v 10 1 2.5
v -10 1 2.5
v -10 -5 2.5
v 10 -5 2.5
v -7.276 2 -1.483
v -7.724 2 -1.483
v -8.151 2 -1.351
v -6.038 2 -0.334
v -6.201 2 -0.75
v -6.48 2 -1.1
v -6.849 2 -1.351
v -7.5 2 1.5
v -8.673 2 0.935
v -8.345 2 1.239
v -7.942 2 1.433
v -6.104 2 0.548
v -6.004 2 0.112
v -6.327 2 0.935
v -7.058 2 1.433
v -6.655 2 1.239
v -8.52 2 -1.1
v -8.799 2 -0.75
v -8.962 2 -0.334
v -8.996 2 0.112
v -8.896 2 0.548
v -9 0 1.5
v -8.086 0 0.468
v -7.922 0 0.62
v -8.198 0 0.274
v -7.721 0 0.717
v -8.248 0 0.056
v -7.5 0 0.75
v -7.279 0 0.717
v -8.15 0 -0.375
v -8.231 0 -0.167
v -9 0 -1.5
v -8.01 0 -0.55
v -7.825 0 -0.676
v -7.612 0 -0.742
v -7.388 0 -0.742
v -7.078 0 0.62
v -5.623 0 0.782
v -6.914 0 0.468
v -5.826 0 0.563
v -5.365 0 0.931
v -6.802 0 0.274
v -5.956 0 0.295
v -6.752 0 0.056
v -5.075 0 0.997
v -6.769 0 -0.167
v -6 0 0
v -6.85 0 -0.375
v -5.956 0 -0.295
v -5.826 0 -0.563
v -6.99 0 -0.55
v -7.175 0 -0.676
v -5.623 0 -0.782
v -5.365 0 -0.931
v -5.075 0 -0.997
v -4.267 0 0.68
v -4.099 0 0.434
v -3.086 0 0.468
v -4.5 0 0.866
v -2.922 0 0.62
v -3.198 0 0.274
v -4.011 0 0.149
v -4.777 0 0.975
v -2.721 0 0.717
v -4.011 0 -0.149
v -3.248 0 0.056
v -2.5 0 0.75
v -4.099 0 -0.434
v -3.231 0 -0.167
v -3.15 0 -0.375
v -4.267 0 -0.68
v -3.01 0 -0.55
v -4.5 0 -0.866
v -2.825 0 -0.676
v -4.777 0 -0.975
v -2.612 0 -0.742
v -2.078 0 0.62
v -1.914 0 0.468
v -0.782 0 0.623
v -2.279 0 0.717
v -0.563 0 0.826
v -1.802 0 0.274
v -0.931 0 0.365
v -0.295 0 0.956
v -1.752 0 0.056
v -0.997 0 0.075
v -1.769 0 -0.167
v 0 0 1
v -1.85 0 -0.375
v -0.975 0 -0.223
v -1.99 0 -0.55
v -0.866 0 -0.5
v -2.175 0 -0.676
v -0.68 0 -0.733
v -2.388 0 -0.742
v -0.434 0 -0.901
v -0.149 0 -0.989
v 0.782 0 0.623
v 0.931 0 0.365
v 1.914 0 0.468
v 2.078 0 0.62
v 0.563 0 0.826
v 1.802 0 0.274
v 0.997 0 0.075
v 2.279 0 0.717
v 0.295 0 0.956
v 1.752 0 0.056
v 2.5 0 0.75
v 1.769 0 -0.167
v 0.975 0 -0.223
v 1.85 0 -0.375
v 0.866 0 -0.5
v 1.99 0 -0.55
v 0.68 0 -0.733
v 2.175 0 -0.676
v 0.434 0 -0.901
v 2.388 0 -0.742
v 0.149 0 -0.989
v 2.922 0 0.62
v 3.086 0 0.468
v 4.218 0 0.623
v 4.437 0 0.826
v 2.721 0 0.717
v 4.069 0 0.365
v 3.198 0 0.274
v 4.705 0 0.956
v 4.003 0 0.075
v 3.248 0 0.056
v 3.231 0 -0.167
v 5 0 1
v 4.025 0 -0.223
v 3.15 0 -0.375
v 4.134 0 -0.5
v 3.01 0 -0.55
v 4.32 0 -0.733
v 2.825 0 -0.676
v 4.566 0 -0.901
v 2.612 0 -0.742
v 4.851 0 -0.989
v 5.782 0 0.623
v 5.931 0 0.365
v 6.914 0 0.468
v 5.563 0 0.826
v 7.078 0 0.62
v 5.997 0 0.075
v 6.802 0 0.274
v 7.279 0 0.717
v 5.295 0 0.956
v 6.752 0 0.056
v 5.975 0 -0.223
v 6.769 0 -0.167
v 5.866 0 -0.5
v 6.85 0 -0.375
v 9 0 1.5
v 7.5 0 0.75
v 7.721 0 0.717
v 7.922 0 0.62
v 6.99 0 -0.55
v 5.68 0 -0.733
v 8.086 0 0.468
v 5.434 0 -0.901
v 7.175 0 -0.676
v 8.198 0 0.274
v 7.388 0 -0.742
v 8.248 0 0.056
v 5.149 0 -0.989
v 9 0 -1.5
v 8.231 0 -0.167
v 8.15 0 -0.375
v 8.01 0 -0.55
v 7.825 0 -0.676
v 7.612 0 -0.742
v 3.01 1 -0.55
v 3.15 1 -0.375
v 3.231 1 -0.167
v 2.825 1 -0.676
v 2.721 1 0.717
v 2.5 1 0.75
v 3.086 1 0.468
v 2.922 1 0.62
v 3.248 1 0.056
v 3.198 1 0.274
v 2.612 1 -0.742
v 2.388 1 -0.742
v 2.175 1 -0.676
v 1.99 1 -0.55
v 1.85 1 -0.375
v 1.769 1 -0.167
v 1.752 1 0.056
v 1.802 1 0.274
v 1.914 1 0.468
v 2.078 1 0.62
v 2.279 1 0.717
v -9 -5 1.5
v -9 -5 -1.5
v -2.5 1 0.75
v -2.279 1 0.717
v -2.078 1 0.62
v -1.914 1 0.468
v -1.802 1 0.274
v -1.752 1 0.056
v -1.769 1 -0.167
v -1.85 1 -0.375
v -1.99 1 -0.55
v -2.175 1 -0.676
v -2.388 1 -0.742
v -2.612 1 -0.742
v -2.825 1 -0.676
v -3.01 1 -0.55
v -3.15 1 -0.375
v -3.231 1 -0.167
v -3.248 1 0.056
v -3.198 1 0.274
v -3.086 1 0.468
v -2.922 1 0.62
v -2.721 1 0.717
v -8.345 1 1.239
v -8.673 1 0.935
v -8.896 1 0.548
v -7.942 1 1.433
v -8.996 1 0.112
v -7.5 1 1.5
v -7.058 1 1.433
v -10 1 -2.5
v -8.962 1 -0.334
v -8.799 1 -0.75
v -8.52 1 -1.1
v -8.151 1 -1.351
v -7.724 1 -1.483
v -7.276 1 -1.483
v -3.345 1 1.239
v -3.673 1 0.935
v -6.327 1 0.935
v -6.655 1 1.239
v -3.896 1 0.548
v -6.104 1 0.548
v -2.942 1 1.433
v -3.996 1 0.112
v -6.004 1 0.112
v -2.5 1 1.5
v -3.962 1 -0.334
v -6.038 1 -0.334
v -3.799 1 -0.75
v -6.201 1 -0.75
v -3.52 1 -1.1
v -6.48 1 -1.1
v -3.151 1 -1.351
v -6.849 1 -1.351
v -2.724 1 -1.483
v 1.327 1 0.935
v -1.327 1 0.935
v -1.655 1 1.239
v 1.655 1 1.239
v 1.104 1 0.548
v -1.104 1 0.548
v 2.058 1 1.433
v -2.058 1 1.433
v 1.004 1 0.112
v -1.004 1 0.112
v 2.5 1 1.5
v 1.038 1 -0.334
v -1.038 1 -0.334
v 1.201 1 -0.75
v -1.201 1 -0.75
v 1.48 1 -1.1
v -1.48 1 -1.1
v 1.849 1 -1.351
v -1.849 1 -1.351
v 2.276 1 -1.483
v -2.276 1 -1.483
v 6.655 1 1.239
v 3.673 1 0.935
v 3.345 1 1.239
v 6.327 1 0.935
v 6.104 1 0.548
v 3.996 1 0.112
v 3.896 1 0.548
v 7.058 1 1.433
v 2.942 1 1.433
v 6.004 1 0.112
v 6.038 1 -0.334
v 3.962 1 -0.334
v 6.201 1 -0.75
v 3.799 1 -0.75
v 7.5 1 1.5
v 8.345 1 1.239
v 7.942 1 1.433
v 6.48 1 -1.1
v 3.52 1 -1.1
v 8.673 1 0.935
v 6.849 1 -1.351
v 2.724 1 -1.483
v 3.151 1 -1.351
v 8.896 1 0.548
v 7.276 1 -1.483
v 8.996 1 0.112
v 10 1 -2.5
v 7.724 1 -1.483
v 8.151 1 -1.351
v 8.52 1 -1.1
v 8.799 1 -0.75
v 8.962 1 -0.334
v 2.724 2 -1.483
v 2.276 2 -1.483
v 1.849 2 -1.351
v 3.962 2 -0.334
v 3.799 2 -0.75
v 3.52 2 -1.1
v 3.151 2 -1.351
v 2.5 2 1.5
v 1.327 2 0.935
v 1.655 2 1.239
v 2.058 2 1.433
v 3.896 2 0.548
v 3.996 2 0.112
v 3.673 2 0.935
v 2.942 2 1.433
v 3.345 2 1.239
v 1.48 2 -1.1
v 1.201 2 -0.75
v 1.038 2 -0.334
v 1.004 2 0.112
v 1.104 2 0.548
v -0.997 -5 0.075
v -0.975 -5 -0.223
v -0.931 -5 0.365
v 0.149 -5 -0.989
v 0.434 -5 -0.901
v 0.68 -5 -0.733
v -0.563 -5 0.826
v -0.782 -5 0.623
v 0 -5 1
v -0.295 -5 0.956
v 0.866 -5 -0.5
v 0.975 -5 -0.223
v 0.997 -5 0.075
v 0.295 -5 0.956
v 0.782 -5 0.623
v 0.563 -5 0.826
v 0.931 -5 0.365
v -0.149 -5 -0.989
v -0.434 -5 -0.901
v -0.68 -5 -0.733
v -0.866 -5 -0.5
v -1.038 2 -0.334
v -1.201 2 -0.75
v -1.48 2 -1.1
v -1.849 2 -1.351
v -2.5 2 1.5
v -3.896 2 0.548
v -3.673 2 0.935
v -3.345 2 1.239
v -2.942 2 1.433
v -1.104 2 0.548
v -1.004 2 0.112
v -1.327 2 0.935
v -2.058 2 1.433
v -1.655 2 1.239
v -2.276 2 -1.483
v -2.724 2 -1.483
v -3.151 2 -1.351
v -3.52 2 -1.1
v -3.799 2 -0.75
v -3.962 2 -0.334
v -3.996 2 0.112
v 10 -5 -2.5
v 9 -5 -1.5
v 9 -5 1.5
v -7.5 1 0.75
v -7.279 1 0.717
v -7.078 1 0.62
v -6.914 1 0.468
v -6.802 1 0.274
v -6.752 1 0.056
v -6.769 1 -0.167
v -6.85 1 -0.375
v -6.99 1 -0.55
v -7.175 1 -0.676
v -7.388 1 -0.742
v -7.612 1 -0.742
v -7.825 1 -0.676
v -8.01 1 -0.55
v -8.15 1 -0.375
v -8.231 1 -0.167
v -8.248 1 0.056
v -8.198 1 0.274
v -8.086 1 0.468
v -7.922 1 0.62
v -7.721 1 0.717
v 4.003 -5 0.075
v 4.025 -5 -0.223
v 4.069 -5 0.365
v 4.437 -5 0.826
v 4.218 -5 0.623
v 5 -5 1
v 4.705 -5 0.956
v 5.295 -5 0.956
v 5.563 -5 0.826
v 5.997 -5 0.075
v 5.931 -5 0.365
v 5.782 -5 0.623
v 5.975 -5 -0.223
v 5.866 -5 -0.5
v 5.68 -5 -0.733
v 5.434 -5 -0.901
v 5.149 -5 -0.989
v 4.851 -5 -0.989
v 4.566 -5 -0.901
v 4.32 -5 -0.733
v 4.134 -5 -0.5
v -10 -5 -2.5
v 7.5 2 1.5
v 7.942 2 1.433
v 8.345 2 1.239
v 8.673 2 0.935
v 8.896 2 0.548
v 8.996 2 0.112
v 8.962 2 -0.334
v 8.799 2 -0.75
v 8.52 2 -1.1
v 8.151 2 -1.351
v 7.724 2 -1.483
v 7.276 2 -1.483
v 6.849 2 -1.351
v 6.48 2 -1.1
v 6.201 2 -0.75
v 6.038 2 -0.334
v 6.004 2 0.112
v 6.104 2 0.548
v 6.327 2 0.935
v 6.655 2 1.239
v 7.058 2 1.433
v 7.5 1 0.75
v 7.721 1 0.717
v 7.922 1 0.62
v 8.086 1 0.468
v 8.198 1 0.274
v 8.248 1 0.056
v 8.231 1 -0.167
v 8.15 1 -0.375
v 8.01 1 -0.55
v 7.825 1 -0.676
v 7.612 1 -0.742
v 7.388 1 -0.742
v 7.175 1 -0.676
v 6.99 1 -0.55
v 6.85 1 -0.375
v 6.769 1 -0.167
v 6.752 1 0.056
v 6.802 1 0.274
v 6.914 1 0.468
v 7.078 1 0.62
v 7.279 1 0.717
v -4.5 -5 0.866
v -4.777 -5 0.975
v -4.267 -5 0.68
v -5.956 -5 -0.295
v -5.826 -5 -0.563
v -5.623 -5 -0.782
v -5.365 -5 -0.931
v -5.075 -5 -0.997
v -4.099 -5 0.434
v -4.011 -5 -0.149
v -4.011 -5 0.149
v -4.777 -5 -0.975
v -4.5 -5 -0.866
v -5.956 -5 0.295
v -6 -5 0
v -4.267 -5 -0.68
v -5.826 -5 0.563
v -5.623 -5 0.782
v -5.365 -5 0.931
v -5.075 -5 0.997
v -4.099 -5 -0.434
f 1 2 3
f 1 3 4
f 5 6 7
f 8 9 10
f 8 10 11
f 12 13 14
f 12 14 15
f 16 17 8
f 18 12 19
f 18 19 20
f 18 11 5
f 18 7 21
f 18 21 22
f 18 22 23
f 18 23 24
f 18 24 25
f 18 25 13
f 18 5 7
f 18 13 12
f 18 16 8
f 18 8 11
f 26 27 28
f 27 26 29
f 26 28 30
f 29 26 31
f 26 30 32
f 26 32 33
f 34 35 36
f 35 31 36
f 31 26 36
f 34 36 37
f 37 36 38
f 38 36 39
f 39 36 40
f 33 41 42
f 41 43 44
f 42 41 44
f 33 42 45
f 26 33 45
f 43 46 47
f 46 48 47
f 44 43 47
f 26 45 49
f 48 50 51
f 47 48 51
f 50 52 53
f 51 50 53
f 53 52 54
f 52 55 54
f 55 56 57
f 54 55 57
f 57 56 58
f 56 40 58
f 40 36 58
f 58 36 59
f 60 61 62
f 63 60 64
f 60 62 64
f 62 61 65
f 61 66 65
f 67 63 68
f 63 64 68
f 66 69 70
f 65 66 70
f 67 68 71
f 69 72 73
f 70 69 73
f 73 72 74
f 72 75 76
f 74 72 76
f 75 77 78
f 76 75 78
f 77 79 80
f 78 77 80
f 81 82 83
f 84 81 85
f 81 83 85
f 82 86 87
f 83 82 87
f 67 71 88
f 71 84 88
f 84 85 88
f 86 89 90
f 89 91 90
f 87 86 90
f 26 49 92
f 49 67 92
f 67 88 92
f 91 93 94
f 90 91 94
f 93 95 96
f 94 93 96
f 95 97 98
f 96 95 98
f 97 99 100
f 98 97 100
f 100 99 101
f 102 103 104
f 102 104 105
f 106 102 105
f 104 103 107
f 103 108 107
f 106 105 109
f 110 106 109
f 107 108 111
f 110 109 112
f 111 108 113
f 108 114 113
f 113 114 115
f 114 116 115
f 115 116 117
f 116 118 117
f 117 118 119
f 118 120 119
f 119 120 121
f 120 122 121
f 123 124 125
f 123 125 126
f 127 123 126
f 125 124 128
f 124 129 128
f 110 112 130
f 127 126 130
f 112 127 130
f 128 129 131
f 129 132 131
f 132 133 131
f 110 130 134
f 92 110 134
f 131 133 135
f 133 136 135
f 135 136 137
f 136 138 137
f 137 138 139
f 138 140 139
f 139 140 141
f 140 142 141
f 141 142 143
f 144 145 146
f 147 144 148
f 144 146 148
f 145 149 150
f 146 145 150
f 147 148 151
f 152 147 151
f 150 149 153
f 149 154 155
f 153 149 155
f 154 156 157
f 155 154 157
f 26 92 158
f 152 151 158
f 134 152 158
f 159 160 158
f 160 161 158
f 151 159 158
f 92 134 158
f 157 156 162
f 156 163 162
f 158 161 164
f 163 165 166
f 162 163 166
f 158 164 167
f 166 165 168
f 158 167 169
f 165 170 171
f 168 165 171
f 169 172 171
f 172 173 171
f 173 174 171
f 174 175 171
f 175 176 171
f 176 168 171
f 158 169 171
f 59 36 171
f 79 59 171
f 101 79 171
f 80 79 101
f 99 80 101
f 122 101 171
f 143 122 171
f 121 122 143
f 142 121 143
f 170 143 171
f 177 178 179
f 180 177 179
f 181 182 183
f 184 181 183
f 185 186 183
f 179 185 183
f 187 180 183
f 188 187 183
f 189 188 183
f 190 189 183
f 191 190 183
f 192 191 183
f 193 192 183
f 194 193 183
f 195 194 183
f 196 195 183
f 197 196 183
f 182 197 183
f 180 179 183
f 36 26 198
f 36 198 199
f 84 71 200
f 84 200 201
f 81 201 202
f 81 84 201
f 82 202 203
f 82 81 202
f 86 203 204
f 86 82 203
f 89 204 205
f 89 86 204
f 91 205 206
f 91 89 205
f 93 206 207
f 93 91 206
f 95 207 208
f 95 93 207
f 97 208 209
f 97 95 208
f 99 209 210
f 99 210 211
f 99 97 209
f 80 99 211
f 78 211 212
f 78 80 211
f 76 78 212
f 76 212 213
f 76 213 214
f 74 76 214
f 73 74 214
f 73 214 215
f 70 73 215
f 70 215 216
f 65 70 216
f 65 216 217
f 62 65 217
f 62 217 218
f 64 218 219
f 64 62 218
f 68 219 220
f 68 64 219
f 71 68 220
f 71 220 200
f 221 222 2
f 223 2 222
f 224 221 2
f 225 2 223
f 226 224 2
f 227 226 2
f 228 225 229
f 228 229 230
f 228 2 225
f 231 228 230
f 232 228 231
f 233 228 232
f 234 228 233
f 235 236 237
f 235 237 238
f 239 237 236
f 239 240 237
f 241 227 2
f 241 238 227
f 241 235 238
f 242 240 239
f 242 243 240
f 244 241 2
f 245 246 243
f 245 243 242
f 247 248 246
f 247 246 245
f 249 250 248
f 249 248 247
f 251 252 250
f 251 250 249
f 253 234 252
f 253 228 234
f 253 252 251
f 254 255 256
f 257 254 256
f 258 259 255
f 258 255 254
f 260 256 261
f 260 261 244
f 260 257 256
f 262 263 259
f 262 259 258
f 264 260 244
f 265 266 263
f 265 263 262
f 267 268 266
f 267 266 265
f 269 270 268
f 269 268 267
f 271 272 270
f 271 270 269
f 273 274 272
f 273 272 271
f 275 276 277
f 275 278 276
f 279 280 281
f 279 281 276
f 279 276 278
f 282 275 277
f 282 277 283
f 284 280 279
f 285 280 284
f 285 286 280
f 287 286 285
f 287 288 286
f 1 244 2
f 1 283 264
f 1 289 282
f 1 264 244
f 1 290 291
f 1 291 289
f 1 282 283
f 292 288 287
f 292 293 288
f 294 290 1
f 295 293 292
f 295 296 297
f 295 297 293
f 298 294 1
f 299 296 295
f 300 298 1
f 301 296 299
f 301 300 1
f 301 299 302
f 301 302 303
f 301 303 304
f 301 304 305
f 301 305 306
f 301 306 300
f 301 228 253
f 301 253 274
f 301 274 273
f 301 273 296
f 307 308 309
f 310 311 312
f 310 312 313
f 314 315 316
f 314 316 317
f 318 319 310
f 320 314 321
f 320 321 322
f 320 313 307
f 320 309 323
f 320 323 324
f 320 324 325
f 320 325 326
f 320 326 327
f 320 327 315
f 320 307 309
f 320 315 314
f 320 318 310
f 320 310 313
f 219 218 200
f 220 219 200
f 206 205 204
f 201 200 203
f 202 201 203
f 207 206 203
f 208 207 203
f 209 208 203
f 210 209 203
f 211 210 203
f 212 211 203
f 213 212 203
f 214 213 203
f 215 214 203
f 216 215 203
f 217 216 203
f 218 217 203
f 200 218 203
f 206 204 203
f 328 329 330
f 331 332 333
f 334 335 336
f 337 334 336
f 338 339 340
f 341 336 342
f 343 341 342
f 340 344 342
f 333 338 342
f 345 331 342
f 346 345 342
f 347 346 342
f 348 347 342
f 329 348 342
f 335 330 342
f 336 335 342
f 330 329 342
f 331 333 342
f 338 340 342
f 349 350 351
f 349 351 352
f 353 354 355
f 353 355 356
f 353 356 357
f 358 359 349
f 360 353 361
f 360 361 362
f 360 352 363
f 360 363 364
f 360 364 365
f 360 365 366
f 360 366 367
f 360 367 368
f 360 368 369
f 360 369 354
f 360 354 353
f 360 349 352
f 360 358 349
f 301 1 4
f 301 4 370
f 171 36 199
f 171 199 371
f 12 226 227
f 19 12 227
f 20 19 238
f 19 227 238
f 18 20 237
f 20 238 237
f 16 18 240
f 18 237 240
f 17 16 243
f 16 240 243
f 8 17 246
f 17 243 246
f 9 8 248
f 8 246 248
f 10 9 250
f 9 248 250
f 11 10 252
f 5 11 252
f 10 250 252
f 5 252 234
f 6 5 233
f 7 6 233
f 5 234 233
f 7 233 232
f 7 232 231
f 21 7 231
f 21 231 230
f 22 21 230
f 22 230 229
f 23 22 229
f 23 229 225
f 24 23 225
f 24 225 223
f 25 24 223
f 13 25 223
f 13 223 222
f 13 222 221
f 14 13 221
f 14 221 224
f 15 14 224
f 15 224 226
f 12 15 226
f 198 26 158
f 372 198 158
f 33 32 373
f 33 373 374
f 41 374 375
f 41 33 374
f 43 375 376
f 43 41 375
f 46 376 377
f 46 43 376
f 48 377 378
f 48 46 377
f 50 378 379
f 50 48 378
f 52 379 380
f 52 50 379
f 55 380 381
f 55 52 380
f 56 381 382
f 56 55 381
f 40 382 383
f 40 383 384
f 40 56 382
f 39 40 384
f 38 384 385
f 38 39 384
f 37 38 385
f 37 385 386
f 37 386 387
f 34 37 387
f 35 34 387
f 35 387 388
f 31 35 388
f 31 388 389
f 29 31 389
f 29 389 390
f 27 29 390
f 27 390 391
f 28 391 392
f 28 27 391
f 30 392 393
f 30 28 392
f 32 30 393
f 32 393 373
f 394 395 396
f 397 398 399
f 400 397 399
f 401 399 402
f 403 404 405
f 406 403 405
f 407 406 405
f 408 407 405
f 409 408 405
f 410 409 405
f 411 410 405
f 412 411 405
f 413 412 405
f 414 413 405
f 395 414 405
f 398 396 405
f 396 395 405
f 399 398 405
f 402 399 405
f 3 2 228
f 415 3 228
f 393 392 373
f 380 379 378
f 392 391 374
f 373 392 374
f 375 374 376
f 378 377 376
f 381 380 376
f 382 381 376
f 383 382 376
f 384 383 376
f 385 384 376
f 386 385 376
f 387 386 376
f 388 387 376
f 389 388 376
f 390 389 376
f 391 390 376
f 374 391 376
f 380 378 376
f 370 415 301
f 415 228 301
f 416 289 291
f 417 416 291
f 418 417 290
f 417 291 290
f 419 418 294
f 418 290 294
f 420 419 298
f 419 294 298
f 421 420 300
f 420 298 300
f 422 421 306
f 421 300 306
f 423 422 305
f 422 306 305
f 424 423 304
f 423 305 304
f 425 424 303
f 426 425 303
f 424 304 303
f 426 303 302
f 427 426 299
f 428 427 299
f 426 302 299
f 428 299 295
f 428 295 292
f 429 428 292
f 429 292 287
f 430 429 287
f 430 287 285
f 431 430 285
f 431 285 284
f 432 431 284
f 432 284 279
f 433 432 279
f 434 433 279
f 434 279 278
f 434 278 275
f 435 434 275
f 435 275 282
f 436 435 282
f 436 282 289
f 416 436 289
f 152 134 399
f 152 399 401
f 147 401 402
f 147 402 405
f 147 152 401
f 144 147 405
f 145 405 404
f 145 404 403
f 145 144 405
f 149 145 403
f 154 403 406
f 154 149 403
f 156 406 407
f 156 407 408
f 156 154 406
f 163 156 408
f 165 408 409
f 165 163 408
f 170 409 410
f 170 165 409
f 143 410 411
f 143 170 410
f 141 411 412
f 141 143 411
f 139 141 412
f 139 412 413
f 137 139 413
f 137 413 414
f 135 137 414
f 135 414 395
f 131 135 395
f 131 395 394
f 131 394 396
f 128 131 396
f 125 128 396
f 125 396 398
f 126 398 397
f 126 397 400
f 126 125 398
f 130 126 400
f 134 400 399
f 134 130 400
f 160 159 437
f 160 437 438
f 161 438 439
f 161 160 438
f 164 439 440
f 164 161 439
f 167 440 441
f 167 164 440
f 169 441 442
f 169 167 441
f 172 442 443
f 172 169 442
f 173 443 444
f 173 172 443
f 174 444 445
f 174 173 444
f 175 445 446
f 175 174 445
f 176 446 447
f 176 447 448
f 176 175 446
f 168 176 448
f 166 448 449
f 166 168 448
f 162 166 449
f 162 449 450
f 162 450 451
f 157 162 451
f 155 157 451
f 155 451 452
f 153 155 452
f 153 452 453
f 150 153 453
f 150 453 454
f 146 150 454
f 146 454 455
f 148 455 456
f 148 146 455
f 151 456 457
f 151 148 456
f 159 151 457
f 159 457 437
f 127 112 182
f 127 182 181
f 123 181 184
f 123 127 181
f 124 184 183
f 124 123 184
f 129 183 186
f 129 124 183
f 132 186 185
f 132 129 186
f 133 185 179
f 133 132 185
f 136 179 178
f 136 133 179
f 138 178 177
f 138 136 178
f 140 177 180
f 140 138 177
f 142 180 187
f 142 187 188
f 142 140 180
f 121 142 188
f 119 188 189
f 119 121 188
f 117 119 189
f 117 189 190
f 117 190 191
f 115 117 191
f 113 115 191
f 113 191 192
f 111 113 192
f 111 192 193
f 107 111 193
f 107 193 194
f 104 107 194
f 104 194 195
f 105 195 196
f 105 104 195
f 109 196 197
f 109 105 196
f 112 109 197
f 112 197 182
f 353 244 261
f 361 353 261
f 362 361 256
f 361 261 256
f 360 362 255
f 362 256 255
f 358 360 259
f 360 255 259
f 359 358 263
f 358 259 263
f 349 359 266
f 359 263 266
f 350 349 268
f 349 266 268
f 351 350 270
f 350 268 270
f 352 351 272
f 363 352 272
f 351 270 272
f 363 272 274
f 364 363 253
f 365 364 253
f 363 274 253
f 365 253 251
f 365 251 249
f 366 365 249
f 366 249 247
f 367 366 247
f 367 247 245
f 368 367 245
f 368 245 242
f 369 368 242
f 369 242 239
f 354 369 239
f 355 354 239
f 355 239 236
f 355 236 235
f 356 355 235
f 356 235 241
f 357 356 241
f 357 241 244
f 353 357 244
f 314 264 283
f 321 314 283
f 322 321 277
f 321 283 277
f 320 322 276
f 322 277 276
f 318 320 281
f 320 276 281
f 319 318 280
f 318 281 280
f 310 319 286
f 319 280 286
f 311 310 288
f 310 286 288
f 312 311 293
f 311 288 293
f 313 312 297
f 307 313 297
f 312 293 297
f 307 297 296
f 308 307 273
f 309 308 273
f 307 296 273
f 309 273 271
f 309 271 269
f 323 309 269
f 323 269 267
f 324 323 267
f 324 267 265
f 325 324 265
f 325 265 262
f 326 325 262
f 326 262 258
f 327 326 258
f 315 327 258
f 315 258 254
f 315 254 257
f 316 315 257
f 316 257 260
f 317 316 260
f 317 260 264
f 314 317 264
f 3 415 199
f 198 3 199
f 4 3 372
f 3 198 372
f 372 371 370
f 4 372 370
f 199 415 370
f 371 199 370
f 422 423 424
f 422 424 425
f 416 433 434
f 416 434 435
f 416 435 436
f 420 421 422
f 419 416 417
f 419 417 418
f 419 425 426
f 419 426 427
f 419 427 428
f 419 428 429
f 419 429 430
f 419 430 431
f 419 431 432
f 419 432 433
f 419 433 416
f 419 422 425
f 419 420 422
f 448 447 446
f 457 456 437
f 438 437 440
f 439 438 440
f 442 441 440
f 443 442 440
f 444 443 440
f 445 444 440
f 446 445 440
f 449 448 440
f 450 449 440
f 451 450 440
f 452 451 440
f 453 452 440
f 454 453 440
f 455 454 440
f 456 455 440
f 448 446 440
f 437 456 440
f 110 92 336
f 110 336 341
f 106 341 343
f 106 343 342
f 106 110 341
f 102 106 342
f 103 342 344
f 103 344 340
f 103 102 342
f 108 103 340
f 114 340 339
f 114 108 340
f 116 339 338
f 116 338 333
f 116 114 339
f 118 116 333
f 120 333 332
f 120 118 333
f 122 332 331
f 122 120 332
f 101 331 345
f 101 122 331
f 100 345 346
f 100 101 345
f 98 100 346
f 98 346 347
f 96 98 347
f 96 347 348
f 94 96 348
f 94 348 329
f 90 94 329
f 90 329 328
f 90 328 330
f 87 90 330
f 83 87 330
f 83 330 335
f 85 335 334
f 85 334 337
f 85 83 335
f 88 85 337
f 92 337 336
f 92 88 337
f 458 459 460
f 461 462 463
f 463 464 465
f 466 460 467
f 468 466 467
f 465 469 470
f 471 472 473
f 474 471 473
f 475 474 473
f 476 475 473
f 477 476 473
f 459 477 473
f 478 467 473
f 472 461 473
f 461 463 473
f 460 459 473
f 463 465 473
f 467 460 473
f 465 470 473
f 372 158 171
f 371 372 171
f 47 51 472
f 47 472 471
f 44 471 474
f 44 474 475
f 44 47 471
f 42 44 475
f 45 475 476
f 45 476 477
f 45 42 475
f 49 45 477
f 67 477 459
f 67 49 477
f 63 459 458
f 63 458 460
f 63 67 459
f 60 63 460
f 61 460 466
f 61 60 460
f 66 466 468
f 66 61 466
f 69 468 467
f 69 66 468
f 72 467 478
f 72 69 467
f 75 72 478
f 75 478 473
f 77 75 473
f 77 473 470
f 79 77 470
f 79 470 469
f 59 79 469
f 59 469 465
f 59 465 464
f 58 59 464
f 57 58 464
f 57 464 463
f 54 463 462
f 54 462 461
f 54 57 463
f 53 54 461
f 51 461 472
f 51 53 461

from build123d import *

# Parameters (mm, degrees)
SKETCH1_R             = 1.5
BOSS_EXTRUDE1_DEPTH   = 2
BOSS_EXTRUDE1_2_DEPTH = 2
BOSS_EXTRUDE1_3_DEPTH = 2
BOSS_EXTRUDE1_4_DEPTH = 2
SKETCH1_3_W           = 20
SKETCH1_3_H           = 5
BOSS_EXTRUDE2_DEPTH   = 1
SKETCH1_4_R           = 0.75
CUT_EXTRUDE1_DEPTH    = 1
SKETCH1_6_W           = 20
SKETCH1_6_H           = 5
SKETCH1_6_W_2         = 18
SKETCH1_6_H_2         = 3
SKETCH1_6_R           = 1
BOSS_EXTRUDE4_DEPTH   = 5


with BuildPart() as part:
    # Sketch1 → Boss-Extrude1 (new body)
    with BuildSketch(Plane(origin=(0, 0, 0), x_dir=(1, 0, 0), z_dir=(0, 1, 0))):
        with Locations((-7.5, 0)):
            Circle(SKETCH1_R)
    extrude(amount=BOSS_EXTRUDE1_DEPTH)



with BuildPart() as body_2:
    # Sketch1 → Boss-Extrude1 2 (new body)
    with BuildSketch(Plane(origin=(0, 0, 0), x_dir=(1, 0, 0), z_dir=(0, 1, 0))):
        with Locations((-2.5, 0)):
            Circle(SKETCH1_R)
    extrude(amount=BOSS_EXTRUDE1_2_DEPTH)


with BuildPart() as body_3:
    # Sketch1 → Boss-Extrude1 3 (new body)
    with BuildSketch(Plane(origin=(0, 0, 0), x_dir=(1, 0, 0), z_dir=(0, 1, 0))):
        with Locations((2.5, 0)):
            Circle(SKETCH1_R)
    extrude(amount=BOSS_EXTRUDE1_3_DEPTH)


with BuildPart() as body_4:
    # Sketch1 → Boss-Extrude1 4 (new body)
    with BuildSketch(Plane(origin=(0, 0, 0), x_dir=(1, 0, 0), z_dir=(0, 1, 0))):
        with Locations((7.5, 0)):
            Circle(SKETCH1_R)
    extrude(amount=BOSS_EXTRUDE1_4_DEPTH)


with BuildPart() as part_1:
    add(part.part)

    add(body_2.part)  # Boss-Extrude2 merges body 2

    add(body_3.part)  # Boss-Extrude2 merges body 3

    add(body_4.part)  # Boss-Extrude2 merges body 4
    # Sketch1<3> → Boss-Extrude2 (add)
    with BuildSketch(Plane(origin=(0, 0, 0), x_dir=(1, 0, 0), z_dir=(0, 1, 0))):
        Rectangle(SKETCH1_3_W, SKETCH1_3_H)
    extrude(amount=BOSS_EXTRUDE2_DEPTH)

    # Sketch1<4> → Cut-Extrude1 (cut)
    with BuildSketch(Plane(origin=(0, 0, 0), x_dir=(1, 0, 0), z_dir=(0, 1, 0))):
        with Locations((-7.5, 0)):
            Circle(SKETCH1_4_R)
        with Locations((-2.5, 0)):
            Circle(SKETCH1_4_R)
        with Locations((2.5, 0)):
            Circle(SKETCH1_4_R)
        with Locations((7.5, 0)):
            Circle(SKETCH1_4_R)
    extrude(amount=CUT_EXTRUDE1_DEPTH, mode=Mode.SUBTRACT)

    # Sketch1<6> → Boss-Extrude4 (add)
    # profile 1 of 4: a face of its own
    with BuildSketch(Plane(origin=(0, 0, 0), x_dir=(1, 0, 0), z_dir=(0, 1, 0))):
        Rectangle(SKETCH1_6_W, SKETCH1_6_H)
        Rectangle(SKETCH1_6_W_2, SKETCH1_6_H_2, mode=Mode.SUBTRACT)
    # profile 2 of 4: a face of its own
    with BuildSketch(Plane(origin=(0, 0, 0), x_dir=(1, 0, 0), z_dir=(0, 1, 0))):
        with Locations((5, 0)):
            Circle(SKETCH1_6_R)
    # profile 3 of 4: a face of its own
    with BuildSketch(Plane(origin=(0, 0, 0), x_dir=(1, 0, 0), z_dir=(0, 1, 0))):
        Circle(SKETCH1_6_R)
    # profile 4 of 4: a face of its own
    with BuildSketch(Plane(origin=(0, 0, 0), x_dir=(1, 0, 0), z_dir=(0, 1, 0))):
        with Locations((-5, 0)):
            Circle(SKETCH1_6_R)
    extrude(amount=-BOSS_EXTRUDE4_DEPTH)


solid = part_1.part
